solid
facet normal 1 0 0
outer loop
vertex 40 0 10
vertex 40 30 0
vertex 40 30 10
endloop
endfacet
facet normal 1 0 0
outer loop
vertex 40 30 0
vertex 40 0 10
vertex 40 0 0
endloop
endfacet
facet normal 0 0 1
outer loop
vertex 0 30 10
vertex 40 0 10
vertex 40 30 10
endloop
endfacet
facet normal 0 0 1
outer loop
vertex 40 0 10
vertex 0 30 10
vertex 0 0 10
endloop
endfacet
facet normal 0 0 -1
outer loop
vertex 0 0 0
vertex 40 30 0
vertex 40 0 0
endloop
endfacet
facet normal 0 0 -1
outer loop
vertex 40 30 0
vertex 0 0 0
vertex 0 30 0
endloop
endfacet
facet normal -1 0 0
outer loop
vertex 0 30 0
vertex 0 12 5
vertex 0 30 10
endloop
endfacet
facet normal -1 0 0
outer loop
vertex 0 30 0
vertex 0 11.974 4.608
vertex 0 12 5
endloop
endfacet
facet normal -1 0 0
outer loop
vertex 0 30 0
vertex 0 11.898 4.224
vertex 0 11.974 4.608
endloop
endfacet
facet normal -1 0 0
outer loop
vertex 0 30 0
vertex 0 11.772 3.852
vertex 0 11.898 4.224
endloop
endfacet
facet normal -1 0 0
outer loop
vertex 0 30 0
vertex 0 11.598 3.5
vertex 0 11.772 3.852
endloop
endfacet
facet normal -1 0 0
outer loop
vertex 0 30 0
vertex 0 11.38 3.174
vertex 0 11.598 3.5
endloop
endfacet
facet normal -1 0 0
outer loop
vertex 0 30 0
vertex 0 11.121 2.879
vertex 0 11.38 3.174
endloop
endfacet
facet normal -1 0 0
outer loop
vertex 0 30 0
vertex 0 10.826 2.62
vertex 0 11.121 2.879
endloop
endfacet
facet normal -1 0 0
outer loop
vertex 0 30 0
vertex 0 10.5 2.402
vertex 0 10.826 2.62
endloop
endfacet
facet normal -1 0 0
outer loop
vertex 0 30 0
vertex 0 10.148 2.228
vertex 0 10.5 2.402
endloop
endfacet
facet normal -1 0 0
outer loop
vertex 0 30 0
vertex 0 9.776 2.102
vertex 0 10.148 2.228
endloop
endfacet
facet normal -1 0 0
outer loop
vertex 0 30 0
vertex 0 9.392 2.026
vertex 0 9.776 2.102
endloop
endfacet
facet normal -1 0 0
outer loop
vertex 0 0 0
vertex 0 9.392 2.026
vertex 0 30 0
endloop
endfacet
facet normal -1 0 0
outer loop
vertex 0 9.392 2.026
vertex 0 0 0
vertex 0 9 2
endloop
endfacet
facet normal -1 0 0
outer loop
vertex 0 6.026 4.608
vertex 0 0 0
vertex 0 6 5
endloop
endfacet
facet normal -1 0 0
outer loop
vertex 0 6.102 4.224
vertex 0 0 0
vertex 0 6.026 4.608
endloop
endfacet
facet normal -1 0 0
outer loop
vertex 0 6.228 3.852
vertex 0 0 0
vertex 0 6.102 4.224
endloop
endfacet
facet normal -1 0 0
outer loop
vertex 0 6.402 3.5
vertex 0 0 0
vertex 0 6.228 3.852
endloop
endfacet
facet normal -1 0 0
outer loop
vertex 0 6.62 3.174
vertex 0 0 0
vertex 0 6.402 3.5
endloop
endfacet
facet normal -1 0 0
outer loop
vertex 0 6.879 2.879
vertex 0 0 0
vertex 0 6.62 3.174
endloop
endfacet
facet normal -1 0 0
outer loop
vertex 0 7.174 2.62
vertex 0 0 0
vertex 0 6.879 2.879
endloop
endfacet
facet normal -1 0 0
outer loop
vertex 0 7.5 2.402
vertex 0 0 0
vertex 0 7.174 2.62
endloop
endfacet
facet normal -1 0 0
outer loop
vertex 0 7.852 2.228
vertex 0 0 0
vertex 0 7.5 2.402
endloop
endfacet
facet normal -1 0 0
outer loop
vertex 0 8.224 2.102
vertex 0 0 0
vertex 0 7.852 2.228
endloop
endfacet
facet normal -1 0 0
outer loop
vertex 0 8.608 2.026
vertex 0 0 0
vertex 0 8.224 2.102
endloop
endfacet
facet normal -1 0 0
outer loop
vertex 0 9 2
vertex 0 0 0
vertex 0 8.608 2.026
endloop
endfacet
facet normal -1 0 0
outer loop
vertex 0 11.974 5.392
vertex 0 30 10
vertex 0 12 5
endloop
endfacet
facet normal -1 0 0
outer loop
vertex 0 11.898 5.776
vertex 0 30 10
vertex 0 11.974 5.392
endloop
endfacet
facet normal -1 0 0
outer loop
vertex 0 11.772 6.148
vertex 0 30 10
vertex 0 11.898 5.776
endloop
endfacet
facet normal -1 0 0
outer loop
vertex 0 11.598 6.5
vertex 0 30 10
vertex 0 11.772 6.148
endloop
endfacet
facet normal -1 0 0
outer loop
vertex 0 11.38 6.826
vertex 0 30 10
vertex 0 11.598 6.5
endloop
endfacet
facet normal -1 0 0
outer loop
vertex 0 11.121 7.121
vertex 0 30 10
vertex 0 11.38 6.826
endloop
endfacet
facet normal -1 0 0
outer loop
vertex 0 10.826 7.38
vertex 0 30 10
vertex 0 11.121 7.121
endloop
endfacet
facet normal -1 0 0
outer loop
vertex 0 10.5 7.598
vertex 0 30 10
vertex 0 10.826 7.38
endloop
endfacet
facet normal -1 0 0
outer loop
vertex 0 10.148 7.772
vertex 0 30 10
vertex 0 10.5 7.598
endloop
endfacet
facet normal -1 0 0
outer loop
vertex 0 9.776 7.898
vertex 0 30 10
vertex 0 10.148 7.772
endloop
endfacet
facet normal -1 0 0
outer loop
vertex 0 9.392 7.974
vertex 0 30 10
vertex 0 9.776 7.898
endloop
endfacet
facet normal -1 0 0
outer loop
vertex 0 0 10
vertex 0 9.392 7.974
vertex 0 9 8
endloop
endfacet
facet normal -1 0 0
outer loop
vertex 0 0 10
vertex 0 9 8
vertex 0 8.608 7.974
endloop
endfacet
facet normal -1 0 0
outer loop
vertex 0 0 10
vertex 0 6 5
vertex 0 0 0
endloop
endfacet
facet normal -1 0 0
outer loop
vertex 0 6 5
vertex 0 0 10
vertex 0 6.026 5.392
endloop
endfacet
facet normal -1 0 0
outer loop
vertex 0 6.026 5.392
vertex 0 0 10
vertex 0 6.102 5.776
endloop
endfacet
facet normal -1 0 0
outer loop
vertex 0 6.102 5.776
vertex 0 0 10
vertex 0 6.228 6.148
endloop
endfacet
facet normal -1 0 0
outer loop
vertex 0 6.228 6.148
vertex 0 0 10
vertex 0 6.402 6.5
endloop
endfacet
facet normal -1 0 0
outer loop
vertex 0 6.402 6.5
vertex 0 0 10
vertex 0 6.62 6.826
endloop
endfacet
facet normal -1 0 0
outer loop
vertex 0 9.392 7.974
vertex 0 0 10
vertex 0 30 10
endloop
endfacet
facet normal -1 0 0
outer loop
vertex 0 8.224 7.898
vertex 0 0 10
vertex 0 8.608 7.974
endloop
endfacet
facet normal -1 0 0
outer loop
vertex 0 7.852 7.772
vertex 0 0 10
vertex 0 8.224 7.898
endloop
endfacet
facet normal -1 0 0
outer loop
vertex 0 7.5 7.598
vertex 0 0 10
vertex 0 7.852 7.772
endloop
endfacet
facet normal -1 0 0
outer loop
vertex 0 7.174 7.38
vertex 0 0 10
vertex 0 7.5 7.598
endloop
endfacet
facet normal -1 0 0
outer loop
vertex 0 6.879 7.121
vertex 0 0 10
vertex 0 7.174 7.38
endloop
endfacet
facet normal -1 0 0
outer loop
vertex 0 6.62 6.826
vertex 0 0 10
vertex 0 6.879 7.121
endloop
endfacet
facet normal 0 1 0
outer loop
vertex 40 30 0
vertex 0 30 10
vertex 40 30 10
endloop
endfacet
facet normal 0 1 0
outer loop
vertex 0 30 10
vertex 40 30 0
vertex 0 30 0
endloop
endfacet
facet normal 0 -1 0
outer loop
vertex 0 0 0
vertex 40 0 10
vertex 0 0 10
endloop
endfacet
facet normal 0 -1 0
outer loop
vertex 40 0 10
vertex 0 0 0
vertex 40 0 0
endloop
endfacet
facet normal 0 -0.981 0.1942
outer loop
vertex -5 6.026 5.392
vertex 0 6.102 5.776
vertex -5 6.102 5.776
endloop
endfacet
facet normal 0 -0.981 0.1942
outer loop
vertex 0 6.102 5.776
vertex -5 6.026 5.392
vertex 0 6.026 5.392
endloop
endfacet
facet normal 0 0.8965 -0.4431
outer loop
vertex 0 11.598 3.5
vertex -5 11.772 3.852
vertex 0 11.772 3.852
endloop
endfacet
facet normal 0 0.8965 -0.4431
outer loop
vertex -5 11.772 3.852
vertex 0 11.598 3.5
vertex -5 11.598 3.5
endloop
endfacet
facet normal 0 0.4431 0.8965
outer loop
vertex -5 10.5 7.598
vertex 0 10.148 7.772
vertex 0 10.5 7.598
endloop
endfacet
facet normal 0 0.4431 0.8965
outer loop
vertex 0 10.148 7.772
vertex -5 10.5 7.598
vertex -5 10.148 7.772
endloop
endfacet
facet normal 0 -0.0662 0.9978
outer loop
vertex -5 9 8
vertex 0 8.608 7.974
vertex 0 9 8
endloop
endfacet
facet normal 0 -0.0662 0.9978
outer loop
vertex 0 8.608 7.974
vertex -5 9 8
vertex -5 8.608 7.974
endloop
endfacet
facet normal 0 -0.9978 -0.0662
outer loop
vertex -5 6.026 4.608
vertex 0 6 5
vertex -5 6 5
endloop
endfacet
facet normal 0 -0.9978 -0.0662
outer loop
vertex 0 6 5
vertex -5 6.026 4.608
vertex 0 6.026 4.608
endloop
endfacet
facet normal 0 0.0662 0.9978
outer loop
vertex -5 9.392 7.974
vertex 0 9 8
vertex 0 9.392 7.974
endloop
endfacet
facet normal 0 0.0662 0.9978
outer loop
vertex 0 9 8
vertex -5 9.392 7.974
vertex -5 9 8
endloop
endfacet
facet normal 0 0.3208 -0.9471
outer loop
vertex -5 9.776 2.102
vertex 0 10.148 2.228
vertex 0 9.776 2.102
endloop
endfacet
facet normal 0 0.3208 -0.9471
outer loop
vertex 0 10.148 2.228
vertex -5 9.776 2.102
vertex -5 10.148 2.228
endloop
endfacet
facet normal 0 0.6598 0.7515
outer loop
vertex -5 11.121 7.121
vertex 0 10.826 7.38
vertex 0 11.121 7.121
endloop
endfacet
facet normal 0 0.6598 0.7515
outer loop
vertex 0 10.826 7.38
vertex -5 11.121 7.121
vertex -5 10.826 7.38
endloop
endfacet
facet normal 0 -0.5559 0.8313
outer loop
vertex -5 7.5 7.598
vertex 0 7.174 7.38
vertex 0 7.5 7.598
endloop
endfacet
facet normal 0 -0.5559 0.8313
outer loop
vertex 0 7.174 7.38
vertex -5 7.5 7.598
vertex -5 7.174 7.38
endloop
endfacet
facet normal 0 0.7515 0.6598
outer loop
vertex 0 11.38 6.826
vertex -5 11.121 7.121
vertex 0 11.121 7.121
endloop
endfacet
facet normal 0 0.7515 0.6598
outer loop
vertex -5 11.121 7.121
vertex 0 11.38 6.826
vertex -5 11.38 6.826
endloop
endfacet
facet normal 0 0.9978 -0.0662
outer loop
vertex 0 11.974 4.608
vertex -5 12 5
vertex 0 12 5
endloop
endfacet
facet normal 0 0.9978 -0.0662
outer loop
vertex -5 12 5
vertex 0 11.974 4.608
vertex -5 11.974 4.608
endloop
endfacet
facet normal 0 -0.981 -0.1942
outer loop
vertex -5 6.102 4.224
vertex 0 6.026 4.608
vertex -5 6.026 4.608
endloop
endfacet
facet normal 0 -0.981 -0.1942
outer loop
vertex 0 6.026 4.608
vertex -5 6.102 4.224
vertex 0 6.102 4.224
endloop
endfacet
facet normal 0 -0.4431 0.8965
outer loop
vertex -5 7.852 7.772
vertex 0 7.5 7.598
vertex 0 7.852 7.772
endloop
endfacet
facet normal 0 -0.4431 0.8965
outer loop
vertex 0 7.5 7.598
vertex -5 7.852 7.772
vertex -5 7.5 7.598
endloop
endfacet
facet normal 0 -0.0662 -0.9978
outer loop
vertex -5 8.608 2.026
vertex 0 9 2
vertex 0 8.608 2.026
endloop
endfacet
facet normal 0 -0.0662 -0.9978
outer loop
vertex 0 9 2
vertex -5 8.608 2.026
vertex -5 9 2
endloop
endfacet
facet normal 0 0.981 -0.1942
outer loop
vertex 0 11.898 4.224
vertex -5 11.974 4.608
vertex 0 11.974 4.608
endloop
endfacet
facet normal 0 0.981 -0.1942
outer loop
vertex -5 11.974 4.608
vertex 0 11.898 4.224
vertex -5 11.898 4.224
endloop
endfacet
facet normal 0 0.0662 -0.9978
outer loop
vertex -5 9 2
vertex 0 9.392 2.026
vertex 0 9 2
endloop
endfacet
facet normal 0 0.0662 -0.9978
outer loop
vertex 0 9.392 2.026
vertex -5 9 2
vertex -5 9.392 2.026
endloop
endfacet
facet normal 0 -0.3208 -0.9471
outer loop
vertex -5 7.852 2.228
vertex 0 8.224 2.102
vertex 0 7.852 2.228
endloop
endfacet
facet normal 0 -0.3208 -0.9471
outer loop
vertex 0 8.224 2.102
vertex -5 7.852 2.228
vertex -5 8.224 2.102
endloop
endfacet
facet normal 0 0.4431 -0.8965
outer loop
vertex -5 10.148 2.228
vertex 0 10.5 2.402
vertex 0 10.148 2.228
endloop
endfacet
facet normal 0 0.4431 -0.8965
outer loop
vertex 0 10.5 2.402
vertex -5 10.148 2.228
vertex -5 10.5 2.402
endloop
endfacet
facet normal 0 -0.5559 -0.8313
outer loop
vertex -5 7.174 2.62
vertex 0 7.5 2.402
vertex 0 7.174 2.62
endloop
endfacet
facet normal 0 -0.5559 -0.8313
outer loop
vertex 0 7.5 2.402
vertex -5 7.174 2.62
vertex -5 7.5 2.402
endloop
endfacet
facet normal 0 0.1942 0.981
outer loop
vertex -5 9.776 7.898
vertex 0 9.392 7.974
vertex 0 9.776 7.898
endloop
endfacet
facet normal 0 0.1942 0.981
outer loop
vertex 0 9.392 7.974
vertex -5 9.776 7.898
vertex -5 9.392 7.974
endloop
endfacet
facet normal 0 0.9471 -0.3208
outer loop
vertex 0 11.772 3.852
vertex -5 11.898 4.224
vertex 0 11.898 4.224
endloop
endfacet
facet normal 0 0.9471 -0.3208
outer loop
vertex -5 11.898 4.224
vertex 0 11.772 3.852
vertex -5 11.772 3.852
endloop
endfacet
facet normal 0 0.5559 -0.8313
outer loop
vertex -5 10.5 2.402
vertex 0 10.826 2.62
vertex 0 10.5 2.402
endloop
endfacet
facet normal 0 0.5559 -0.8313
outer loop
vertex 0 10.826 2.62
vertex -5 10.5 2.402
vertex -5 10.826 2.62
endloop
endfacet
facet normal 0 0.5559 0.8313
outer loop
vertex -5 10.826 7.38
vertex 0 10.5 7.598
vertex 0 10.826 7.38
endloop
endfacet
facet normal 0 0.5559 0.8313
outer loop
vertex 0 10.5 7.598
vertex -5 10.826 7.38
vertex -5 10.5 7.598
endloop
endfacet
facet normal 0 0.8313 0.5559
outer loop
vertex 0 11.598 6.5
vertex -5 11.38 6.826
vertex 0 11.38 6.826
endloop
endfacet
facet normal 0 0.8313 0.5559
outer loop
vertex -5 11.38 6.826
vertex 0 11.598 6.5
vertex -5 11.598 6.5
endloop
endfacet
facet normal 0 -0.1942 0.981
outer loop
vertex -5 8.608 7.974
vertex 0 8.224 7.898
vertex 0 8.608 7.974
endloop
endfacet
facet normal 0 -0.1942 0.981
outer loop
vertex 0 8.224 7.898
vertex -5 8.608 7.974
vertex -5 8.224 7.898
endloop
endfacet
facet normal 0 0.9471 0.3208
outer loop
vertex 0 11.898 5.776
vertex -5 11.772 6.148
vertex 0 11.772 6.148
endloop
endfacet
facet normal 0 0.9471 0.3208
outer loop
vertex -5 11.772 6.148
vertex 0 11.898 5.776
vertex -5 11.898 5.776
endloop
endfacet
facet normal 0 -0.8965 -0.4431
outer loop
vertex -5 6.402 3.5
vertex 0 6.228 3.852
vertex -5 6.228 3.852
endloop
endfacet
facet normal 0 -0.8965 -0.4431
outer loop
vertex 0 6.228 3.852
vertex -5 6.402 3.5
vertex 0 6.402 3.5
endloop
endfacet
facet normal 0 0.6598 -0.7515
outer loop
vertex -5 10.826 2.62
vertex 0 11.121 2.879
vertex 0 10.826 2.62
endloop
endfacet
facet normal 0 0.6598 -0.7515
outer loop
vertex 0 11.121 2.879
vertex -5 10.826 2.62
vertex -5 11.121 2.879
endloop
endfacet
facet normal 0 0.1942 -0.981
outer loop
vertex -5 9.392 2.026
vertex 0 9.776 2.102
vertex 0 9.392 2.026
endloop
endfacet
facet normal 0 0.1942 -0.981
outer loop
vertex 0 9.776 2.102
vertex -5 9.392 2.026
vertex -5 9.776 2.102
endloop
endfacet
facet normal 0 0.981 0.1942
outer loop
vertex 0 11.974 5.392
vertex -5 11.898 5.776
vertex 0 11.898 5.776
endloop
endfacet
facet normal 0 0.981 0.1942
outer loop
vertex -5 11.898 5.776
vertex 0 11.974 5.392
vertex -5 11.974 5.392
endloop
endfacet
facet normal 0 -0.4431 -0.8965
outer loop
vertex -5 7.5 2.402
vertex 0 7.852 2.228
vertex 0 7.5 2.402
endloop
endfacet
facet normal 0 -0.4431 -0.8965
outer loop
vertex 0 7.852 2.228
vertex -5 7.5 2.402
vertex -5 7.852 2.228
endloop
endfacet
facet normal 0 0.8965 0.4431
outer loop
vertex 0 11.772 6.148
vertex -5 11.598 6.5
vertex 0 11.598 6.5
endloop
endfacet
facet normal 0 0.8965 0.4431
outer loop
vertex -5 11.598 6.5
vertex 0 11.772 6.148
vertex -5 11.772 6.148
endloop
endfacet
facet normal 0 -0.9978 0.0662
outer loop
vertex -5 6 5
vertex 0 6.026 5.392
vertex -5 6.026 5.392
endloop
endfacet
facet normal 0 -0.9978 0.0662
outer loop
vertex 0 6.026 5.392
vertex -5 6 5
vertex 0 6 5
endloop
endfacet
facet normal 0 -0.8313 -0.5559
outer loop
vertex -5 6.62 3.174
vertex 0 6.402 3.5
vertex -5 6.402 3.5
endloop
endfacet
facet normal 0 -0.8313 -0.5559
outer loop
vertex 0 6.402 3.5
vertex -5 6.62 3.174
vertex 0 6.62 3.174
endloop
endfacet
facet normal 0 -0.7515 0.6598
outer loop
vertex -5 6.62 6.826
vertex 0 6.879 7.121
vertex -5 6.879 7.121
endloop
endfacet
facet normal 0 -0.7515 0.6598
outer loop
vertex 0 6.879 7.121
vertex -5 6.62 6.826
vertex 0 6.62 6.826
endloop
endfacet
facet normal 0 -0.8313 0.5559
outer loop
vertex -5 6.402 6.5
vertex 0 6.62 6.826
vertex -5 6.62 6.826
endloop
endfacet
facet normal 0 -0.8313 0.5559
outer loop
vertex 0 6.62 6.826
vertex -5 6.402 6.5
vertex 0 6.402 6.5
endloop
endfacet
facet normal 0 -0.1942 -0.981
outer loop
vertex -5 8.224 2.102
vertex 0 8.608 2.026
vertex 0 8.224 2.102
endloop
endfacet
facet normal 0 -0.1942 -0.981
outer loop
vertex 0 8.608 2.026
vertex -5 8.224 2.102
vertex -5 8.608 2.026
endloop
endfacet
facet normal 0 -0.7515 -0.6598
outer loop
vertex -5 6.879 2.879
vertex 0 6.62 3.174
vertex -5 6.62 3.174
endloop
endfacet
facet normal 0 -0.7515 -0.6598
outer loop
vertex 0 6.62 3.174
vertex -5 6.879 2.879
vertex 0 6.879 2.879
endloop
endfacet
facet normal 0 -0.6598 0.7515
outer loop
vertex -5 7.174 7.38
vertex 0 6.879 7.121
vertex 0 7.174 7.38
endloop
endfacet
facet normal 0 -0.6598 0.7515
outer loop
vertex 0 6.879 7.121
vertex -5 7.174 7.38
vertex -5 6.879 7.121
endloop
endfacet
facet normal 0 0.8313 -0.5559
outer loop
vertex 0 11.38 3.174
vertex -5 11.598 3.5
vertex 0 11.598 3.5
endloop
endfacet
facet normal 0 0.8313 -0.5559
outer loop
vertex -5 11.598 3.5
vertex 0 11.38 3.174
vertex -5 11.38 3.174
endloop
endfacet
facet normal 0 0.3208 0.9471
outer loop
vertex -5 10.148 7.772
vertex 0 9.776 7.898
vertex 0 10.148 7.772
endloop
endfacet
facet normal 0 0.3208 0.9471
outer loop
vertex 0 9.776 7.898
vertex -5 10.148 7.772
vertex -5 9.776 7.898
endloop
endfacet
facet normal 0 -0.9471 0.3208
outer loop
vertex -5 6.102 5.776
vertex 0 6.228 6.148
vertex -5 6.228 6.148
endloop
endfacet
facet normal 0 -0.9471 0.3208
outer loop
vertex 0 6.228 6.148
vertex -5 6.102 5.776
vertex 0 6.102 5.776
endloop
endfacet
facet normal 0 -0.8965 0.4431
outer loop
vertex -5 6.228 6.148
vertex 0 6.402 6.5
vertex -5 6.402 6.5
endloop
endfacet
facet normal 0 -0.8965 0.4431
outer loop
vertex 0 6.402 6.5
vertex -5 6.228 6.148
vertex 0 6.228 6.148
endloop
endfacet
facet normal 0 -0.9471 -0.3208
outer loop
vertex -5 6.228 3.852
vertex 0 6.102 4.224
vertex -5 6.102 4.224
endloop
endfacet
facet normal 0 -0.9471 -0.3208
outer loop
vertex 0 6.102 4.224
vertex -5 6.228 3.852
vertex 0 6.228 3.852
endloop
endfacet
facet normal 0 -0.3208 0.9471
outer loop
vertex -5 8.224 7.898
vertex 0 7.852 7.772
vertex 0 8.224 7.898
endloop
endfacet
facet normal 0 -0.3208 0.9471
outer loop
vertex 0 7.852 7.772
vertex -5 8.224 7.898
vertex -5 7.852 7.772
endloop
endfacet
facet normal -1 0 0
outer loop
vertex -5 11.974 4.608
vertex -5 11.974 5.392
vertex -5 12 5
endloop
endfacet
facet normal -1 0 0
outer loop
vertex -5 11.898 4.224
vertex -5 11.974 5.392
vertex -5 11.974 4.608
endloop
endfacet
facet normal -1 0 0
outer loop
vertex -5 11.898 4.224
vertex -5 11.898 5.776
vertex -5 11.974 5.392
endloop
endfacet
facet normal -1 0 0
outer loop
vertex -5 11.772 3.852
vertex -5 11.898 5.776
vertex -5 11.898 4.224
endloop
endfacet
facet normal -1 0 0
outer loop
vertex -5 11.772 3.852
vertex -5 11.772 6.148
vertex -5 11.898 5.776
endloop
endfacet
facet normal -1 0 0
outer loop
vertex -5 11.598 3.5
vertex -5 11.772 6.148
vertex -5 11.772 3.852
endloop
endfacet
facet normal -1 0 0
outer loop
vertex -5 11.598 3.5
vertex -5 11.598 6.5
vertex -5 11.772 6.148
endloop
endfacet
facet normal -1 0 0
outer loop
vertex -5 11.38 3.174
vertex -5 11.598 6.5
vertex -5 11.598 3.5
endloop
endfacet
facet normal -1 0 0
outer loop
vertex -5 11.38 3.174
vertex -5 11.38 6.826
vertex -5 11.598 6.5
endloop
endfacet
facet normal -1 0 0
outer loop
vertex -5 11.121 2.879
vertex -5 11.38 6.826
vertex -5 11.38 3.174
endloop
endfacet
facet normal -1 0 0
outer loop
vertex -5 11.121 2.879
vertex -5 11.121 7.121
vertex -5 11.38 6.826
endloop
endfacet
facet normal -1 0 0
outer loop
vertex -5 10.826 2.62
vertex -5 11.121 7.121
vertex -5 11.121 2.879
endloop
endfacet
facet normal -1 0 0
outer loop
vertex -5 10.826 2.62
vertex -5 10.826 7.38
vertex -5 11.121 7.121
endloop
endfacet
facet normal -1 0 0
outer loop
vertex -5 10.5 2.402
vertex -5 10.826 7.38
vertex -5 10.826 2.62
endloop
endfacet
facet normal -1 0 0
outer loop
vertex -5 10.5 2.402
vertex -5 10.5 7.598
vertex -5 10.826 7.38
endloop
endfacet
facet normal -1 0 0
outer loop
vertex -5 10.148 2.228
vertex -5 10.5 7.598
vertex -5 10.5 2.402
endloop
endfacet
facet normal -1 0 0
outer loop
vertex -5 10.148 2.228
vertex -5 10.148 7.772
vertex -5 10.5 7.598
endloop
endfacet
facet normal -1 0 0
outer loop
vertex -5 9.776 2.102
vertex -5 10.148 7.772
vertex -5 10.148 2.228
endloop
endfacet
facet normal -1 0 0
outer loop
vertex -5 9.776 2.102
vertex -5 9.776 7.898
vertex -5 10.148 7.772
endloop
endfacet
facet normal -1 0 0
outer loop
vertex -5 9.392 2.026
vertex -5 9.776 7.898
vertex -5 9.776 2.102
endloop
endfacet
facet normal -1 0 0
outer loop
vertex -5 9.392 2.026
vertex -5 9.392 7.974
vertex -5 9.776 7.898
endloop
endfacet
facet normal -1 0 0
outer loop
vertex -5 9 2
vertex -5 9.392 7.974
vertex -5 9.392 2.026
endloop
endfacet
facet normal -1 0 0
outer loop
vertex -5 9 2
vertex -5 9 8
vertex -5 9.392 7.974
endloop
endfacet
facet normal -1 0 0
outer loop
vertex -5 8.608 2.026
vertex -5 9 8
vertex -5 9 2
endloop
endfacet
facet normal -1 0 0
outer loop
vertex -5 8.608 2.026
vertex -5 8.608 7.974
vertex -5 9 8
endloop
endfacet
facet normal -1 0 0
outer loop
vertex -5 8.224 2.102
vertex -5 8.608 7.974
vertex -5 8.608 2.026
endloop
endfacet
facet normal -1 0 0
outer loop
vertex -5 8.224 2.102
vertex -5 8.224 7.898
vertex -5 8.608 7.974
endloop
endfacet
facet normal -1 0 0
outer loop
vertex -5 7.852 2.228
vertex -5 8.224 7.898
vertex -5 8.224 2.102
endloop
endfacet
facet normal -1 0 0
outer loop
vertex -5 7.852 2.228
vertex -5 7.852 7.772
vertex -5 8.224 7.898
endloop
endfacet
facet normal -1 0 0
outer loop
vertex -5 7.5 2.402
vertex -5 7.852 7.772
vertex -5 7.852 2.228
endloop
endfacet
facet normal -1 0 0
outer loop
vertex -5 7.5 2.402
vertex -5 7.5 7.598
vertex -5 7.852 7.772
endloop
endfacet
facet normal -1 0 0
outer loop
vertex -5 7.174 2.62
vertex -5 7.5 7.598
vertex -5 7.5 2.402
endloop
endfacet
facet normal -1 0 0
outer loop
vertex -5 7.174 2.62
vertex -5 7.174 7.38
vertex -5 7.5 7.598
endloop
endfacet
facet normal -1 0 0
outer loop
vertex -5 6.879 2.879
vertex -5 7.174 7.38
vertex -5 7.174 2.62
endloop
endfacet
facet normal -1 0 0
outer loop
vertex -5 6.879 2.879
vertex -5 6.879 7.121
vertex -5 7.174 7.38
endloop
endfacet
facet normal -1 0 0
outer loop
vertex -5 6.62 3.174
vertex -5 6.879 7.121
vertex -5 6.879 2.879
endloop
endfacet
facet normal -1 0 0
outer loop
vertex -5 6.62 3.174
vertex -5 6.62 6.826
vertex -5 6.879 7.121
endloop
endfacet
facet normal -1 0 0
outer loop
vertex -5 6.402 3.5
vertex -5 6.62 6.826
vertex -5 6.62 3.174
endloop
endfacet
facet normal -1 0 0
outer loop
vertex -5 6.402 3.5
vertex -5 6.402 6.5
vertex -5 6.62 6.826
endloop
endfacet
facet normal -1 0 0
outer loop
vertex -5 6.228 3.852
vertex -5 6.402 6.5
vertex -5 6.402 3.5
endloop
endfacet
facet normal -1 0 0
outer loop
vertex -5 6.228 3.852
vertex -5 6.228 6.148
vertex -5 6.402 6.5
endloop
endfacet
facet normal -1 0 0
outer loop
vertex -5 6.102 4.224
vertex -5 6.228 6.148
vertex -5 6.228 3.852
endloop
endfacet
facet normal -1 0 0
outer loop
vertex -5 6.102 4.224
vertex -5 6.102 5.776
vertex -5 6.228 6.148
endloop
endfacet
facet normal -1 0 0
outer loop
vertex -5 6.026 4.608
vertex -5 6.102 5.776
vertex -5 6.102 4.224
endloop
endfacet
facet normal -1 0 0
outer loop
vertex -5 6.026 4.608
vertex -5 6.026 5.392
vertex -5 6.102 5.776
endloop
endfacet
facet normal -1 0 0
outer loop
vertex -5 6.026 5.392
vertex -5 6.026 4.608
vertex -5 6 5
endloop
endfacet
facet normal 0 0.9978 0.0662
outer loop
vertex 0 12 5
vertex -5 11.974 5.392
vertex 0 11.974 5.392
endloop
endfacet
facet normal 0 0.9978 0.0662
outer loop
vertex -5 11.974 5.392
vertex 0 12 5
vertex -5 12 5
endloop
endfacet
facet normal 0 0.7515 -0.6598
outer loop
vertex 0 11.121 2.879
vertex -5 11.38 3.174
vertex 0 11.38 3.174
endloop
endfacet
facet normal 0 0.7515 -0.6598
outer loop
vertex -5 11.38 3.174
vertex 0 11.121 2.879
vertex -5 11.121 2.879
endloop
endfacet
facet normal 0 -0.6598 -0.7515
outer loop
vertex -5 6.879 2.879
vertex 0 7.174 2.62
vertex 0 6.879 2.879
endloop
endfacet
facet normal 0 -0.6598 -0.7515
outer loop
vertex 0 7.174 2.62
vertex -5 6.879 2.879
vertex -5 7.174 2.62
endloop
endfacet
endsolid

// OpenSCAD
// units=mm — generated by scad_emitter.py
// part=unnamed
$fn = 48;

union() { cube([40, 30, 10]); translate([0.5, 9, 5]) rotate([0, -90, 0]) cylinder(h=5.5, r=3, $fn=$fn); }
